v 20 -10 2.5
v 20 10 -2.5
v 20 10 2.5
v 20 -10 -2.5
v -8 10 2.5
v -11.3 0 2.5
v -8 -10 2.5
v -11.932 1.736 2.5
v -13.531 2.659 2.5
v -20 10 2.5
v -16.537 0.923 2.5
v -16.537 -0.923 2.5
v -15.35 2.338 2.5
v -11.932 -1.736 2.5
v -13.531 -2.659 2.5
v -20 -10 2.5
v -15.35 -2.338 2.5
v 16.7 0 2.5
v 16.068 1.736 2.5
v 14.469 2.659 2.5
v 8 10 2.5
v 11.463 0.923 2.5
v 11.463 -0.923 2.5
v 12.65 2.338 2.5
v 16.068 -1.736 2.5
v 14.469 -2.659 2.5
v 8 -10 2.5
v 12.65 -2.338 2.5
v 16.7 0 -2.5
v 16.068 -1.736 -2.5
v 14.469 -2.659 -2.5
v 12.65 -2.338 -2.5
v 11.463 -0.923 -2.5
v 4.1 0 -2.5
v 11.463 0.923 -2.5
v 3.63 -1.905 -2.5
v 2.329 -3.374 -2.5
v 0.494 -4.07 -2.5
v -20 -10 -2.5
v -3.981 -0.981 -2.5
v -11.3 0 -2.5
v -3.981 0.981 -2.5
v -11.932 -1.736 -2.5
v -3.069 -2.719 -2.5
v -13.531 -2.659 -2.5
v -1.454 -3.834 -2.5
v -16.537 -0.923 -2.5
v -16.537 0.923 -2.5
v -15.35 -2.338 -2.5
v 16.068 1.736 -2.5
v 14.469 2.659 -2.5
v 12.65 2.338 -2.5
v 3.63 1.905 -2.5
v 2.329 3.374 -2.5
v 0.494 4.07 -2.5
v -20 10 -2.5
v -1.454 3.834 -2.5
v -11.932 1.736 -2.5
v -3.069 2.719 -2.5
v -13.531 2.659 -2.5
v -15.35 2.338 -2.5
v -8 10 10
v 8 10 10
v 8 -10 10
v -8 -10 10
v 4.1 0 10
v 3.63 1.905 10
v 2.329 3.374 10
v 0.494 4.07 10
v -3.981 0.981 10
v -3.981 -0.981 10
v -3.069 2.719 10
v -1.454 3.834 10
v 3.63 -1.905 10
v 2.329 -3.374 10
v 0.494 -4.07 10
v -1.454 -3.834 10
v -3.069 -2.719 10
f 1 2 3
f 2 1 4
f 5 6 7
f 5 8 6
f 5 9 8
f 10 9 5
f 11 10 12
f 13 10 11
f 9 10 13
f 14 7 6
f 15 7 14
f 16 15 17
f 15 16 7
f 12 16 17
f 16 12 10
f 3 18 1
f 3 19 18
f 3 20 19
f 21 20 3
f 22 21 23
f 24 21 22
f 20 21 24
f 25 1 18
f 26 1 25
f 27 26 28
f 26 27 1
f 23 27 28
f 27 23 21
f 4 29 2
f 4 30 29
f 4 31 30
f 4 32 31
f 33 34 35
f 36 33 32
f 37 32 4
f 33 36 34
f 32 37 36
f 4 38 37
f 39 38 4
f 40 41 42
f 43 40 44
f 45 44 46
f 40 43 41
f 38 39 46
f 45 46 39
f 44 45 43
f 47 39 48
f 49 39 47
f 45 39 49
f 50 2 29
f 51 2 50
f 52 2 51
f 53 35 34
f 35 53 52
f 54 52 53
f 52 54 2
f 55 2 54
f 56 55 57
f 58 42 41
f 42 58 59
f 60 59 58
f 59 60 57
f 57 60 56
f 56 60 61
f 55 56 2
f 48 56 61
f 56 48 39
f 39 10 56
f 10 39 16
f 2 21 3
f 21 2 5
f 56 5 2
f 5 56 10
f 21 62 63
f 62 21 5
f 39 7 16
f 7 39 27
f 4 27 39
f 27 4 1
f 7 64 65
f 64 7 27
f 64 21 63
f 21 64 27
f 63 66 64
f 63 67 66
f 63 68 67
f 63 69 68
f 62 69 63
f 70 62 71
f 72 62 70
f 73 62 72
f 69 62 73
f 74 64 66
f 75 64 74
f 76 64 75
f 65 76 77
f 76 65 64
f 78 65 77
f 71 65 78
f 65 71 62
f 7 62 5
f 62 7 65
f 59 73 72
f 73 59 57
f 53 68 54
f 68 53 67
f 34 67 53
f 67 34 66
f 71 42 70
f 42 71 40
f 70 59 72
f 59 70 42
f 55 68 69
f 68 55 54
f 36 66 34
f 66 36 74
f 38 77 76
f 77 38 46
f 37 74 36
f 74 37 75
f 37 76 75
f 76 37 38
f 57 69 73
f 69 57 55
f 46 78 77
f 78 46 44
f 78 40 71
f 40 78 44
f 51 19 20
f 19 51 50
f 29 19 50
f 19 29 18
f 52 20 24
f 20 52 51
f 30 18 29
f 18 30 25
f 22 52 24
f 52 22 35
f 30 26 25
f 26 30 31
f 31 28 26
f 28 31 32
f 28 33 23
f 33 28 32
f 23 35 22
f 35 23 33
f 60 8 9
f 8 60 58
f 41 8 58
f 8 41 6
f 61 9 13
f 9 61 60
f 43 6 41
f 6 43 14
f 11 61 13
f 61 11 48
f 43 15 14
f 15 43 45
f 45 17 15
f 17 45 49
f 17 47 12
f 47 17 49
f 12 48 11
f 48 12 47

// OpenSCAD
// file: Rook_Config.scad
// Rook 3D Printer Configuration
// Created By Jeffrey Olijar 
// Jolijar@gmail.com

// Layer Height
LH = 0.38;

// 608 skate bearing
Bearing_OD = 22.5; 
Bearing_ID = 8;
Bearing_H = 7;

// M3 Nut Diameter
N3 = 7.5;

// M4 Screw Hole Diameter
M4 = 4;

// M5 Screw Hole Diameter
M5 = 5.4;

// M8 Rod Diameter (configure for a tight fit)
M8 = 8.2;

// M8 Nut Diameter
N8 = 15.5;

//LM8UU Bearing
LBD = 15.4; // Diameter
LBH = 25; // Height
LBI = 8;  // Inner Diameter

//Makergear Groovemount
GVO = 16.5; // Outside Diameter
GVI = 12.5;  // Inside Groove Diameter

// Distance Between Centers for X rods
DBCX = 70;
// main file
// Rook 3D Printer 
// Y Rod Holder
// Created By Jeffrey Olijar 
// Jolijar@gmail.com
// Revision 1.00
// 4 x required 

include <Rook_Config.scad> 


module Rook_Y_Rod_Holder(){





difference(){ 
union(){

	translate (v=[0,0,0]){ 
		cube(size =[40,20,5], center = true); 
translate (v=[0,0,4]){
cube(size =[16,20,12], center = true); 
}
		}
	}
union(){


translate(v=[0,0,3]){
	cylinder(h=25,r=M8/2, center = true);
}
	
	
translate(v=[14,0,3]){
		cylinder(h=25,r=M5/2, center = true);
}
translate(v=[-14,0,3]){
		cylinder(h=25,r=M5/2, center = true);
}
	
}}}




















Rook_Y_Rod_Holder();
